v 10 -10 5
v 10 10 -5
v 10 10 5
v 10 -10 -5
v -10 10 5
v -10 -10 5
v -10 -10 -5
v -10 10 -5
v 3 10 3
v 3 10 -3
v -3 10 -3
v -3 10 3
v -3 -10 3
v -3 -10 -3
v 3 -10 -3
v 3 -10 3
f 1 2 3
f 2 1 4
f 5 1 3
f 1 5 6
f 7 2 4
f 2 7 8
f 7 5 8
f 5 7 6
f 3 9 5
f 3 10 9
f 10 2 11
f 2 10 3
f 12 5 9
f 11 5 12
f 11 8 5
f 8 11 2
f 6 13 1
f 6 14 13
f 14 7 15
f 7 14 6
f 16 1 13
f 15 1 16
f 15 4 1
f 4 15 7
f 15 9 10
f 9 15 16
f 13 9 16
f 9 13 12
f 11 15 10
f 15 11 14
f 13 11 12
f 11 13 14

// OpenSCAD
// 01 贯通方槽 —— 棱柱形通道（截面积沿程不变）
//
// 真值：通道瓶颈半径 = min(槽宽, 槽高)/2 = min(6,6)/2 = 3.000mm
//       半径 3.0 的球恰好能通过（零间隙），3.01 过不去。
//
// 用途：基线。棱柱通道上"切哪一刀、往哪个方向切"都不改变答案
//       —— 任何一张完整横切的切片都给出同一个内切圆半径。
difference() {
  cube([20, 20, 10], center = true);
  cube([6, 40, 6], center = true);
}
